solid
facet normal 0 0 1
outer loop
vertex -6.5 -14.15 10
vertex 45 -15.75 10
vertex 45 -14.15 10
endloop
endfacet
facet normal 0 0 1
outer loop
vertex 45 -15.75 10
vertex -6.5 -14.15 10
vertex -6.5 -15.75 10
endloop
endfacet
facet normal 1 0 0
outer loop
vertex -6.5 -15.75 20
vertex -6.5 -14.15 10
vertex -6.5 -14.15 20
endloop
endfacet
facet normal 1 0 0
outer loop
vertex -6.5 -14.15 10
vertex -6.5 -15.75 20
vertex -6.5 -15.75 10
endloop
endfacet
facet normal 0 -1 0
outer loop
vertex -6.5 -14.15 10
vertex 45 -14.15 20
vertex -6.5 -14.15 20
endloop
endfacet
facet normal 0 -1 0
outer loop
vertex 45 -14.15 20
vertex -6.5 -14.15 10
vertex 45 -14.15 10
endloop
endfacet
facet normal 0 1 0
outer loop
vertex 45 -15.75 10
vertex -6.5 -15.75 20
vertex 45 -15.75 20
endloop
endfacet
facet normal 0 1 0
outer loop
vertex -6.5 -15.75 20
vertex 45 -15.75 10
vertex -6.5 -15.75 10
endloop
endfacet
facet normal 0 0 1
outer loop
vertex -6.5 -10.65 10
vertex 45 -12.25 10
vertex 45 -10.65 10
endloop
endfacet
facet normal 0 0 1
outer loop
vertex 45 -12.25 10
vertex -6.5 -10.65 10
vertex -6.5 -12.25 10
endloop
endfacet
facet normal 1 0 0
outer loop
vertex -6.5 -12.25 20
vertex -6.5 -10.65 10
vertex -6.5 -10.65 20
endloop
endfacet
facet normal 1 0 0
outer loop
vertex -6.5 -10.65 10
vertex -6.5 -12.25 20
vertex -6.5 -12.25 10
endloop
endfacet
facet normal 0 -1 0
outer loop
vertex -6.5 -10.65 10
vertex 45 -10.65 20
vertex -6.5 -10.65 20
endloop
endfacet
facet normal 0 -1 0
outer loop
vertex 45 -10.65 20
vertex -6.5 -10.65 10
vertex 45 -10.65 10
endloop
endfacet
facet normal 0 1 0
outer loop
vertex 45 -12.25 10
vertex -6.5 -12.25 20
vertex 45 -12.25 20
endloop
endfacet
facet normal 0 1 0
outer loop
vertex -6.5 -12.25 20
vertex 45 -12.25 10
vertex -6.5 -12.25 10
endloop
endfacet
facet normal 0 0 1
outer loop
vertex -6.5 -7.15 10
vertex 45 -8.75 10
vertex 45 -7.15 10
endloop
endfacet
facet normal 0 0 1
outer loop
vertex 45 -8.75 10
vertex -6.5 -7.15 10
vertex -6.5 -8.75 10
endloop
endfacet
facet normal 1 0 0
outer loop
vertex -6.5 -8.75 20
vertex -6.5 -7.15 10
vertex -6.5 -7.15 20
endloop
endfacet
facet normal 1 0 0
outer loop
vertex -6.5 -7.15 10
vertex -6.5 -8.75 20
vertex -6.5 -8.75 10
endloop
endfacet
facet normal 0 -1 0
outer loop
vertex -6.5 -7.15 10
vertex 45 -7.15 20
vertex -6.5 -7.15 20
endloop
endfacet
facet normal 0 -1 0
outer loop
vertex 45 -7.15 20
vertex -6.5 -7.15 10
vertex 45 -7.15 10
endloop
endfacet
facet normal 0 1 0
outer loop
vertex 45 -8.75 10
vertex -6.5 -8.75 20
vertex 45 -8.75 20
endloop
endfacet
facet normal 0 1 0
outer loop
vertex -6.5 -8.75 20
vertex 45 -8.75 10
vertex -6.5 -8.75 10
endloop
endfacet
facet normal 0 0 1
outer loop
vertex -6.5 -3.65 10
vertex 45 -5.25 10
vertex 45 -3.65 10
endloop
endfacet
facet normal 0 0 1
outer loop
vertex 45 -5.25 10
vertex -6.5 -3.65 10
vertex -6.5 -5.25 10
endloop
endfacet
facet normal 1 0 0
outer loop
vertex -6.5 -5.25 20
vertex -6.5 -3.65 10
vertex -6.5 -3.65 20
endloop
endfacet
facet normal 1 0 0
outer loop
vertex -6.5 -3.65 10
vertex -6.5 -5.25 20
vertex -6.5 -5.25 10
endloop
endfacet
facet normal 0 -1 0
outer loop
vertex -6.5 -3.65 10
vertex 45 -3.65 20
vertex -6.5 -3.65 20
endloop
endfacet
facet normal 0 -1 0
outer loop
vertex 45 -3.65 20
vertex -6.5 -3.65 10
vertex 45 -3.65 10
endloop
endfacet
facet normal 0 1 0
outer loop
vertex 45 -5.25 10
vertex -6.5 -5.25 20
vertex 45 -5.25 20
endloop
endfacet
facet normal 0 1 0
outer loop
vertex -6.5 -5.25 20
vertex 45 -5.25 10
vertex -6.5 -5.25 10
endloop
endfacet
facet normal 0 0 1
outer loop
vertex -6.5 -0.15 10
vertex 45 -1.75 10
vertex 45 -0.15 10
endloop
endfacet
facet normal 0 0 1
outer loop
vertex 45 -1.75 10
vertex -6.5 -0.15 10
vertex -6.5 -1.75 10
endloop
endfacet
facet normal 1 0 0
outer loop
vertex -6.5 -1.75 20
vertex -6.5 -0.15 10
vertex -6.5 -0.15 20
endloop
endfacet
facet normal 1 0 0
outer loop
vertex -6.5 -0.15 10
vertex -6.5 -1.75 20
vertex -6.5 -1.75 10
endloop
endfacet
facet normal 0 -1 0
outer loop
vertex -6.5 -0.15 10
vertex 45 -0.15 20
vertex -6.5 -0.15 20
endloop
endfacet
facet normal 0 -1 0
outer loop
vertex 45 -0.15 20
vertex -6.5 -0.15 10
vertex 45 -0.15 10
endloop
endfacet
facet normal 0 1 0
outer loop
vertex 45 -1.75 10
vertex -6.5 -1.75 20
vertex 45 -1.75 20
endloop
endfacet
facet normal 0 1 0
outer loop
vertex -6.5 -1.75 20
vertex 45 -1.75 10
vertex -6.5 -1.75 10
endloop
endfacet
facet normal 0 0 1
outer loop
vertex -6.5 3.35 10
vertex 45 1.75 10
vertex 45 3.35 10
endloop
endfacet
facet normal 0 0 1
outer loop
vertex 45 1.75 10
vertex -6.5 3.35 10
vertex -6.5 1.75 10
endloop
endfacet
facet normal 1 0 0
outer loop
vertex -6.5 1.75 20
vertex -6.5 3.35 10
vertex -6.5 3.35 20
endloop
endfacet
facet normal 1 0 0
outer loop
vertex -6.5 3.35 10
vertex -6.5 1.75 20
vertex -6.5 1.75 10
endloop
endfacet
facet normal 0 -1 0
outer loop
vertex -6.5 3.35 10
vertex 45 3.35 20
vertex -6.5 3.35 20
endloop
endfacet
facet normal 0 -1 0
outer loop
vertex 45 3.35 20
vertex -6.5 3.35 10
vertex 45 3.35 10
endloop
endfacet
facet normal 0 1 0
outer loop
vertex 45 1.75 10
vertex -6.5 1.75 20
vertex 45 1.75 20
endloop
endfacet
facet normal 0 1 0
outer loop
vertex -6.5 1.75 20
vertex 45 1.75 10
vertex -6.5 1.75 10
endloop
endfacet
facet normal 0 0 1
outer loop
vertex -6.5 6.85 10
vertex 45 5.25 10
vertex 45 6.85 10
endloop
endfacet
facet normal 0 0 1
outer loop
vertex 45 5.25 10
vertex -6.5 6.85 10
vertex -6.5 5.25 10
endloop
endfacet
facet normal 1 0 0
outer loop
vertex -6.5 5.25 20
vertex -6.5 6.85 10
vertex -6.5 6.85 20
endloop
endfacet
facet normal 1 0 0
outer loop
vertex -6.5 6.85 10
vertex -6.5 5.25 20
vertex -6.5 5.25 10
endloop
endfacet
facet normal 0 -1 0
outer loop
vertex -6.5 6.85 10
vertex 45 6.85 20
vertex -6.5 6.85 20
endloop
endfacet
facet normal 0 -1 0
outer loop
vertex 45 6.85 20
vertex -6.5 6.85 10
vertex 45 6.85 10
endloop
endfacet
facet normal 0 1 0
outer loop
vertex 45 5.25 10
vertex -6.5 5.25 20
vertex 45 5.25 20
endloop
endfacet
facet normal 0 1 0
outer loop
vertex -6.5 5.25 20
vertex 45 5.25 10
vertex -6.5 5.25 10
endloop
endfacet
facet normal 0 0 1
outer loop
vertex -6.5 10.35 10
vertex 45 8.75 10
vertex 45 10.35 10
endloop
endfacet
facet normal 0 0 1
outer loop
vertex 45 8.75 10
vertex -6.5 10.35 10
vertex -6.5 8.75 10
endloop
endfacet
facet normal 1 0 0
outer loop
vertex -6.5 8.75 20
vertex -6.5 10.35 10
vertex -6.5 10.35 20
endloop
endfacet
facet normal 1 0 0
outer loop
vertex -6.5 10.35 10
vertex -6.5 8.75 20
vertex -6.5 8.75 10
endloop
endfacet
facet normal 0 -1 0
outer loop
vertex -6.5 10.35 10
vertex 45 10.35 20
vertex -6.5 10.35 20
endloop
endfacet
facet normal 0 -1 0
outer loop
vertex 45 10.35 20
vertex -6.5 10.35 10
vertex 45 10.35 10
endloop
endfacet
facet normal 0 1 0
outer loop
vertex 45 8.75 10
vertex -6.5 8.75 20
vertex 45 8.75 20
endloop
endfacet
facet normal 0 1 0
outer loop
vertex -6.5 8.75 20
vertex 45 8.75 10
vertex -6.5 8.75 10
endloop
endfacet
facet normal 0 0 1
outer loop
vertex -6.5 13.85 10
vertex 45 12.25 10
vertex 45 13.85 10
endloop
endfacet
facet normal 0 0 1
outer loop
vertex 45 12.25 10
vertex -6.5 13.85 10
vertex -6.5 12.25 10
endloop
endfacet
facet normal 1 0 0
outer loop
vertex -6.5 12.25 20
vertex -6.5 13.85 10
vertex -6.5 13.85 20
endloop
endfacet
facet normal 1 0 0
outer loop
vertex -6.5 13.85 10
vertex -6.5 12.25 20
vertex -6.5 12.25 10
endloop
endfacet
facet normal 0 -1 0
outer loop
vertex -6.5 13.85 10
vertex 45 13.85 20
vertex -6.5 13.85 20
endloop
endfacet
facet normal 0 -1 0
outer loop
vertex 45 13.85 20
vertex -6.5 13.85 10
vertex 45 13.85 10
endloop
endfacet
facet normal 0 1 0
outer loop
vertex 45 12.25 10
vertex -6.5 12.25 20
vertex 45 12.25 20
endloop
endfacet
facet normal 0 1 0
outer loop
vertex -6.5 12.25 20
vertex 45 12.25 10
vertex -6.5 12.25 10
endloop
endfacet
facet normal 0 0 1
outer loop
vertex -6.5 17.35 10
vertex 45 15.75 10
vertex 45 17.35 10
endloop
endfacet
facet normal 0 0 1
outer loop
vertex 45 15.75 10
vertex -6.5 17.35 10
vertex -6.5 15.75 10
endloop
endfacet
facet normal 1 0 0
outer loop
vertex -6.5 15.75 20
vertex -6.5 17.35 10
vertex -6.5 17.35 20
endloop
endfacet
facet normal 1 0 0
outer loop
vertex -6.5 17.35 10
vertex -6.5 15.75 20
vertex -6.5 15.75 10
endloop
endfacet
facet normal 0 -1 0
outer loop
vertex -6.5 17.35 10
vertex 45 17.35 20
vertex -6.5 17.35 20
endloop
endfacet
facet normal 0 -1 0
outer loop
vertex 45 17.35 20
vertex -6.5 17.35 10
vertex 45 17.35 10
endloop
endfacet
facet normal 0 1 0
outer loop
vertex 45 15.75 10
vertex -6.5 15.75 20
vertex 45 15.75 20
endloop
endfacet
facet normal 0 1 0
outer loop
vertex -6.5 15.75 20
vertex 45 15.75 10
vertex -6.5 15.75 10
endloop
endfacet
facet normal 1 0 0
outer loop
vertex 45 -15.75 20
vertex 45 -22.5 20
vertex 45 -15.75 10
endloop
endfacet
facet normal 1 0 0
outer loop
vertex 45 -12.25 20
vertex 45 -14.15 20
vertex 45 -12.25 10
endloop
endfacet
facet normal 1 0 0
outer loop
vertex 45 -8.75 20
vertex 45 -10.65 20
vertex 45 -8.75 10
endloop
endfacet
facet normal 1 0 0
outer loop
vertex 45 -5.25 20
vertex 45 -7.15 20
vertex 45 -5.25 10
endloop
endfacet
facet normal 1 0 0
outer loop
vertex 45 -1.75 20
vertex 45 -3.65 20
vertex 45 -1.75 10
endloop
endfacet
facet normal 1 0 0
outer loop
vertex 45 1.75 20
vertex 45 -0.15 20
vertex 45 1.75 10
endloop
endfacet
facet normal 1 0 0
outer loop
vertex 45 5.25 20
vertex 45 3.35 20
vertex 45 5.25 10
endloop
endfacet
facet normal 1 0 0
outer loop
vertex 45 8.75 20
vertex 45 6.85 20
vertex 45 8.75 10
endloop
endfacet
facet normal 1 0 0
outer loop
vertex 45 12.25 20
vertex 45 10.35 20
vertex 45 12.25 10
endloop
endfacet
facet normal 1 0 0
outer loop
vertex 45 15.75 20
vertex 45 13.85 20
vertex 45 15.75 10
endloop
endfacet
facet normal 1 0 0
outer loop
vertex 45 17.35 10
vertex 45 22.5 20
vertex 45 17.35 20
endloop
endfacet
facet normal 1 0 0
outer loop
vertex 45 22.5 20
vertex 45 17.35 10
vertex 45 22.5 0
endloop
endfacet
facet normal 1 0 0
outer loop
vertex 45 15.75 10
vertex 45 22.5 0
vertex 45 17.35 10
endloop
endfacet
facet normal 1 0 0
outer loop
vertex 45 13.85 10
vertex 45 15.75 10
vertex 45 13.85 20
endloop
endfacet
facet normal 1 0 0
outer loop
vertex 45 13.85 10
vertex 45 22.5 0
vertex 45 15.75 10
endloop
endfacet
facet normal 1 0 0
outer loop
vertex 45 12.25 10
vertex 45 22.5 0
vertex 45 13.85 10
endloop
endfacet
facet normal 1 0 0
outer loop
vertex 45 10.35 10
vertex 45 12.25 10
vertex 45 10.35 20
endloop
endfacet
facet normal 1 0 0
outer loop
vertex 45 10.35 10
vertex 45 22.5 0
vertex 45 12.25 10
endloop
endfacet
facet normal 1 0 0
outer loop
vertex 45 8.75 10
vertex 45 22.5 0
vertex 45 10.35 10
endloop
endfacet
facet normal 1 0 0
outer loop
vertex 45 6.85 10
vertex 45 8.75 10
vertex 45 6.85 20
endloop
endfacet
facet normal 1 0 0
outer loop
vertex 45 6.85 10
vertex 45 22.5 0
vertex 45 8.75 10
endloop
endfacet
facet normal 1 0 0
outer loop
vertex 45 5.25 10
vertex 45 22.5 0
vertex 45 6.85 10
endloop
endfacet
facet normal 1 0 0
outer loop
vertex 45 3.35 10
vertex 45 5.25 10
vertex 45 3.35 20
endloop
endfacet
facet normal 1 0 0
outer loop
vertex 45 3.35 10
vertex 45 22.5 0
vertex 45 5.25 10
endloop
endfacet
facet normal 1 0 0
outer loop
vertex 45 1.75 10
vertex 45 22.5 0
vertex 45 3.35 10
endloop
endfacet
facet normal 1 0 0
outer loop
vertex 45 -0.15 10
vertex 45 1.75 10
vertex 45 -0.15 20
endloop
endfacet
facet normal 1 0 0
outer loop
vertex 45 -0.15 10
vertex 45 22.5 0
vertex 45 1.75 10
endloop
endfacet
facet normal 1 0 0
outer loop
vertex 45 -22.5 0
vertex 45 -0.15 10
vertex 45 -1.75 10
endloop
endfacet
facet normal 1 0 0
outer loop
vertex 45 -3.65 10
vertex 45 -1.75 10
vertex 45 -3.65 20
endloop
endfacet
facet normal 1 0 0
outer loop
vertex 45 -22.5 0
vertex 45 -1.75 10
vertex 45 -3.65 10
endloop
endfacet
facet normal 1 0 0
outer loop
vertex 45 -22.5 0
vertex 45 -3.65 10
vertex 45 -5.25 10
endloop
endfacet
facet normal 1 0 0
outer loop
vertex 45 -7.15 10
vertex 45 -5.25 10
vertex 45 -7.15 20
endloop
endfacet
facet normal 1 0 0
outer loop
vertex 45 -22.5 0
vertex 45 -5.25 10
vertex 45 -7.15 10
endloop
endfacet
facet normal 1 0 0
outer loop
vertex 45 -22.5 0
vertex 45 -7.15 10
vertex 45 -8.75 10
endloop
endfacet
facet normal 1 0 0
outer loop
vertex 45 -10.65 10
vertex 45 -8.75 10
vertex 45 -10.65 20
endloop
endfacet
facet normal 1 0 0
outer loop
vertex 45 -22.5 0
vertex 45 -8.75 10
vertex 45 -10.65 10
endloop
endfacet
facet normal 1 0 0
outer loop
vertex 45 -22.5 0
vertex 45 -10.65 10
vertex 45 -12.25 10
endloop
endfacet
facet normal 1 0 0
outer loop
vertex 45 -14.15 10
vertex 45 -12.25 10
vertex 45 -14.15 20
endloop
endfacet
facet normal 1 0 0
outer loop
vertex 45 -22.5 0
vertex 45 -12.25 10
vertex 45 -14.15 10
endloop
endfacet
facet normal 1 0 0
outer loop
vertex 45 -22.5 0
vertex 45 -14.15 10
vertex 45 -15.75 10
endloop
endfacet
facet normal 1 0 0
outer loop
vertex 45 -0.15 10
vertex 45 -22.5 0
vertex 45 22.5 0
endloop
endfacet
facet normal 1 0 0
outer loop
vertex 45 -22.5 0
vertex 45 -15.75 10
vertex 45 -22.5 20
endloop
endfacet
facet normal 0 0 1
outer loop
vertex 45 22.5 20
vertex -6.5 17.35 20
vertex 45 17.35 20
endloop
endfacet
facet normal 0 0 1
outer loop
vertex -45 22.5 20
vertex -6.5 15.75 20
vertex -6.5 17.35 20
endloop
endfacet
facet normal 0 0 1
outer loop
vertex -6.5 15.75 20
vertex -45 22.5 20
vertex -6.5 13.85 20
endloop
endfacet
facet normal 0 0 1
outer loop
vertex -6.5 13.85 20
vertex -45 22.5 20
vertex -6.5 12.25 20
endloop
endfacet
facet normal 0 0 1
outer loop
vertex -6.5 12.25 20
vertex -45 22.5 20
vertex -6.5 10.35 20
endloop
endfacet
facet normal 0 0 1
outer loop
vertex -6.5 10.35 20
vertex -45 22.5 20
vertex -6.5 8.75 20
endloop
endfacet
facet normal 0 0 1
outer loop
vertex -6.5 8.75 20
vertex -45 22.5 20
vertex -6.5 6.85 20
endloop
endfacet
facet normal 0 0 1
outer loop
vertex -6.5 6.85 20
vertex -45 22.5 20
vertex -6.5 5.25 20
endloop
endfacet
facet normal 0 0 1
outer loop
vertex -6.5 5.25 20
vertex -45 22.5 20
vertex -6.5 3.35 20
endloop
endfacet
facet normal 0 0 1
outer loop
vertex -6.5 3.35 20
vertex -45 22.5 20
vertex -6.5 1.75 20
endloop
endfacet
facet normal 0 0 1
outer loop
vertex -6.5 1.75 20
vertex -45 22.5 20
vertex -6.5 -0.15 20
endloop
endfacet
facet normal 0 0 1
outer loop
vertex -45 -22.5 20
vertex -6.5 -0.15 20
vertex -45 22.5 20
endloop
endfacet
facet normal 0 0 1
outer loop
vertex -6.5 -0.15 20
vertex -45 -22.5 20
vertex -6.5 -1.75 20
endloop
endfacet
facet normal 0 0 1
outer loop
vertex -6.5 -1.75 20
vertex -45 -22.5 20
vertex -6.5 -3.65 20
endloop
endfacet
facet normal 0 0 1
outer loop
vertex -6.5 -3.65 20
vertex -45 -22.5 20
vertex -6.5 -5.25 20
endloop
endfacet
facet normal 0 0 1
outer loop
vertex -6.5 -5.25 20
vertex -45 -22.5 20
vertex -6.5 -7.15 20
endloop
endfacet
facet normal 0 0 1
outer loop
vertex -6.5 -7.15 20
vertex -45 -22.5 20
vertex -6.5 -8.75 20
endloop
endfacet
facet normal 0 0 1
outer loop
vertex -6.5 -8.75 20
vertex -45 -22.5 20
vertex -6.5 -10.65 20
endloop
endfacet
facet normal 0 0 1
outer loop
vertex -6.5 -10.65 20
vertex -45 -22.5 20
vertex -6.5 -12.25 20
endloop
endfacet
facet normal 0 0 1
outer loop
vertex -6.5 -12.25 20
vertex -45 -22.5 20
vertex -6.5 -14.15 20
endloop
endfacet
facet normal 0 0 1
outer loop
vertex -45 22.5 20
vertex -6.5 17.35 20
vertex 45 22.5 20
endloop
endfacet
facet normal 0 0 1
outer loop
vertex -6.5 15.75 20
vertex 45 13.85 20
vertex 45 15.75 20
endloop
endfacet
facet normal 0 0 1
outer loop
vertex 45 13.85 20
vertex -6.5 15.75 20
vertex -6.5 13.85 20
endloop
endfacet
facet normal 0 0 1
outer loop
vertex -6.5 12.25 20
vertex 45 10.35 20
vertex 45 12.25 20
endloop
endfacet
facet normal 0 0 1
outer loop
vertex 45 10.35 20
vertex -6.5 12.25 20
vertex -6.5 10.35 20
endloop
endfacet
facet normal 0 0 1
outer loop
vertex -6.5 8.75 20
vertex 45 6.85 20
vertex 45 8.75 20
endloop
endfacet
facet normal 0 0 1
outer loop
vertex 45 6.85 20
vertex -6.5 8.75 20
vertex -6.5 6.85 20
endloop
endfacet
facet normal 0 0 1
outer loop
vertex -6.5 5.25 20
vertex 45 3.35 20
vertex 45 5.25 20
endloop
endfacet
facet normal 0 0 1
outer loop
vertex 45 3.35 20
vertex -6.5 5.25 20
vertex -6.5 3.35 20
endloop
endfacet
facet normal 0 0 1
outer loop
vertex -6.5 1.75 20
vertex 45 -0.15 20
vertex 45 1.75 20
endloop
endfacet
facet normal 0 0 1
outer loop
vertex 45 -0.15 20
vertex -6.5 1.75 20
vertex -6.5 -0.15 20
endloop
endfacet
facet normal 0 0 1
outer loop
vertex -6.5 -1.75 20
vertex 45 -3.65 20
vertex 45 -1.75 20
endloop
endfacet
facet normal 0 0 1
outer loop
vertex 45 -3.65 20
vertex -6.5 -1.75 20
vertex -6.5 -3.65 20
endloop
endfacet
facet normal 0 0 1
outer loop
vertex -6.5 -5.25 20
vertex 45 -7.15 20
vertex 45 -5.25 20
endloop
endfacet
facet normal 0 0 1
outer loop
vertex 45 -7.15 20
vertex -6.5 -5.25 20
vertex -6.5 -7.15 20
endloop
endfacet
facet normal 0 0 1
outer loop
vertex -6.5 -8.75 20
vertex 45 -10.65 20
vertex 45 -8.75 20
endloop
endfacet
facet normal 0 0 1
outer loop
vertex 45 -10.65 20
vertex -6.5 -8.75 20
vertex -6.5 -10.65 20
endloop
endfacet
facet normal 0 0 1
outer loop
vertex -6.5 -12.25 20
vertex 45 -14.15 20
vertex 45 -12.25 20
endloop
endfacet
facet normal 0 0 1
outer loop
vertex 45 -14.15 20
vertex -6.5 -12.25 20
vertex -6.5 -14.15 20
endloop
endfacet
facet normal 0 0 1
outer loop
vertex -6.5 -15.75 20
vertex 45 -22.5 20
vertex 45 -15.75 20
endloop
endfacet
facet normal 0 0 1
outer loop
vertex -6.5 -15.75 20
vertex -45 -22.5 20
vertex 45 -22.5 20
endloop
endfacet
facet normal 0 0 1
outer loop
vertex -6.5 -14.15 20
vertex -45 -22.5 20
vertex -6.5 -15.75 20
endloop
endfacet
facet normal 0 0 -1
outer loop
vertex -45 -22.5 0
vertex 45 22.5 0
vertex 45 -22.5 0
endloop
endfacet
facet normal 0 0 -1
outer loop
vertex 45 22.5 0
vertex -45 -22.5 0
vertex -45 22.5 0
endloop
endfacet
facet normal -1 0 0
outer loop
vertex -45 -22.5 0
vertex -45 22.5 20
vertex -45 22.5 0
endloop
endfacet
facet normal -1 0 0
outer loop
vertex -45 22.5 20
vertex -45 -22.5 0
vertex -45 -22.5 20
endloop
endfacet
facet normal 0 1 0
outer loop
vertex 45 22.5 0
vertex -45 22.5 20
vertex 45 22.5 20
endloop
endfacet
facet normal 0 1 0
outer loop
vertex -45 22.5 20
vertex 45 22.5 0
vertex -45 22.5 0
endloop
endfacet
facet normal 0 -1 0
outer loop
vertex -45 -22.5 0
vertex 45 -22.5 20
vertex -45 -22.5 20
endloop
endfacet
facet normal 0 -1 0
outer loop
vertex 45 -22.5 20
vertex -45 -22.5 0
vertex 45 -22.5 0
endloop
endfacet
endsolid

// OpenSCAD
// Slide drying rack - holds 10 microscope slides standing on their long edge
// Print orientation: base block on the bed (z = 0), slots open upward.

// ---------------- Parameters ----------------
n_slots      = 10;    // number of slide slots
slide_len    = 75;    // slide length along X (mm)
slide_wid    = 25;    // slide width along Y (mm)
slide_thk    = 1;     // slide thickness along Z (mm)

base_len     = 90;    // base block length along X (mm)
base_wid     = 45;    // base block width along Y (mm)
base_h       = 20;    // base block height along Z (mm)

slot_len     = 77;    // slot length along X (mm)   (overlaps the block in X)
slot_w       = 1.6;   // slot width along Y (mm)
slot_depth   = 10;    // slot depth from top face (mm)

slot_pitch   = 3.5;   // centre-to-centre slot spacing along Y (mm)

eps          = 0.5;   // cutter overshoot past the top face (mm)
$fn          = 64;    // circle resolution (no curves here, set per the rules)

// ---------------- Derived ----------------
slot_x0 = -(base_len - slot_len) / 2;   // first slot start X (keeps group centred)
// With 10 slots and a 3.5 mm pitch the span is 31.5 mm, leaving a 12 mm
// gap between the slot ends and the block ends at x = +/-45.

// ---------------- Model ----------------
difference() {
    // Base block
    translate([-base_len / 2, -base_wid / 2, 0])
        cube([base_len, base_wid, base_h]);

    // Parallel slots, open at the top
    for (i = [0 : n_slots - 1]) {
        translate([slot_x0,
                   (i - (n_slots - 1) / 2) * slot_pitch,
                   base_h - slot_depth])
            cube([slot_len, slot_w, slot_depth + eps]);
    }
}
